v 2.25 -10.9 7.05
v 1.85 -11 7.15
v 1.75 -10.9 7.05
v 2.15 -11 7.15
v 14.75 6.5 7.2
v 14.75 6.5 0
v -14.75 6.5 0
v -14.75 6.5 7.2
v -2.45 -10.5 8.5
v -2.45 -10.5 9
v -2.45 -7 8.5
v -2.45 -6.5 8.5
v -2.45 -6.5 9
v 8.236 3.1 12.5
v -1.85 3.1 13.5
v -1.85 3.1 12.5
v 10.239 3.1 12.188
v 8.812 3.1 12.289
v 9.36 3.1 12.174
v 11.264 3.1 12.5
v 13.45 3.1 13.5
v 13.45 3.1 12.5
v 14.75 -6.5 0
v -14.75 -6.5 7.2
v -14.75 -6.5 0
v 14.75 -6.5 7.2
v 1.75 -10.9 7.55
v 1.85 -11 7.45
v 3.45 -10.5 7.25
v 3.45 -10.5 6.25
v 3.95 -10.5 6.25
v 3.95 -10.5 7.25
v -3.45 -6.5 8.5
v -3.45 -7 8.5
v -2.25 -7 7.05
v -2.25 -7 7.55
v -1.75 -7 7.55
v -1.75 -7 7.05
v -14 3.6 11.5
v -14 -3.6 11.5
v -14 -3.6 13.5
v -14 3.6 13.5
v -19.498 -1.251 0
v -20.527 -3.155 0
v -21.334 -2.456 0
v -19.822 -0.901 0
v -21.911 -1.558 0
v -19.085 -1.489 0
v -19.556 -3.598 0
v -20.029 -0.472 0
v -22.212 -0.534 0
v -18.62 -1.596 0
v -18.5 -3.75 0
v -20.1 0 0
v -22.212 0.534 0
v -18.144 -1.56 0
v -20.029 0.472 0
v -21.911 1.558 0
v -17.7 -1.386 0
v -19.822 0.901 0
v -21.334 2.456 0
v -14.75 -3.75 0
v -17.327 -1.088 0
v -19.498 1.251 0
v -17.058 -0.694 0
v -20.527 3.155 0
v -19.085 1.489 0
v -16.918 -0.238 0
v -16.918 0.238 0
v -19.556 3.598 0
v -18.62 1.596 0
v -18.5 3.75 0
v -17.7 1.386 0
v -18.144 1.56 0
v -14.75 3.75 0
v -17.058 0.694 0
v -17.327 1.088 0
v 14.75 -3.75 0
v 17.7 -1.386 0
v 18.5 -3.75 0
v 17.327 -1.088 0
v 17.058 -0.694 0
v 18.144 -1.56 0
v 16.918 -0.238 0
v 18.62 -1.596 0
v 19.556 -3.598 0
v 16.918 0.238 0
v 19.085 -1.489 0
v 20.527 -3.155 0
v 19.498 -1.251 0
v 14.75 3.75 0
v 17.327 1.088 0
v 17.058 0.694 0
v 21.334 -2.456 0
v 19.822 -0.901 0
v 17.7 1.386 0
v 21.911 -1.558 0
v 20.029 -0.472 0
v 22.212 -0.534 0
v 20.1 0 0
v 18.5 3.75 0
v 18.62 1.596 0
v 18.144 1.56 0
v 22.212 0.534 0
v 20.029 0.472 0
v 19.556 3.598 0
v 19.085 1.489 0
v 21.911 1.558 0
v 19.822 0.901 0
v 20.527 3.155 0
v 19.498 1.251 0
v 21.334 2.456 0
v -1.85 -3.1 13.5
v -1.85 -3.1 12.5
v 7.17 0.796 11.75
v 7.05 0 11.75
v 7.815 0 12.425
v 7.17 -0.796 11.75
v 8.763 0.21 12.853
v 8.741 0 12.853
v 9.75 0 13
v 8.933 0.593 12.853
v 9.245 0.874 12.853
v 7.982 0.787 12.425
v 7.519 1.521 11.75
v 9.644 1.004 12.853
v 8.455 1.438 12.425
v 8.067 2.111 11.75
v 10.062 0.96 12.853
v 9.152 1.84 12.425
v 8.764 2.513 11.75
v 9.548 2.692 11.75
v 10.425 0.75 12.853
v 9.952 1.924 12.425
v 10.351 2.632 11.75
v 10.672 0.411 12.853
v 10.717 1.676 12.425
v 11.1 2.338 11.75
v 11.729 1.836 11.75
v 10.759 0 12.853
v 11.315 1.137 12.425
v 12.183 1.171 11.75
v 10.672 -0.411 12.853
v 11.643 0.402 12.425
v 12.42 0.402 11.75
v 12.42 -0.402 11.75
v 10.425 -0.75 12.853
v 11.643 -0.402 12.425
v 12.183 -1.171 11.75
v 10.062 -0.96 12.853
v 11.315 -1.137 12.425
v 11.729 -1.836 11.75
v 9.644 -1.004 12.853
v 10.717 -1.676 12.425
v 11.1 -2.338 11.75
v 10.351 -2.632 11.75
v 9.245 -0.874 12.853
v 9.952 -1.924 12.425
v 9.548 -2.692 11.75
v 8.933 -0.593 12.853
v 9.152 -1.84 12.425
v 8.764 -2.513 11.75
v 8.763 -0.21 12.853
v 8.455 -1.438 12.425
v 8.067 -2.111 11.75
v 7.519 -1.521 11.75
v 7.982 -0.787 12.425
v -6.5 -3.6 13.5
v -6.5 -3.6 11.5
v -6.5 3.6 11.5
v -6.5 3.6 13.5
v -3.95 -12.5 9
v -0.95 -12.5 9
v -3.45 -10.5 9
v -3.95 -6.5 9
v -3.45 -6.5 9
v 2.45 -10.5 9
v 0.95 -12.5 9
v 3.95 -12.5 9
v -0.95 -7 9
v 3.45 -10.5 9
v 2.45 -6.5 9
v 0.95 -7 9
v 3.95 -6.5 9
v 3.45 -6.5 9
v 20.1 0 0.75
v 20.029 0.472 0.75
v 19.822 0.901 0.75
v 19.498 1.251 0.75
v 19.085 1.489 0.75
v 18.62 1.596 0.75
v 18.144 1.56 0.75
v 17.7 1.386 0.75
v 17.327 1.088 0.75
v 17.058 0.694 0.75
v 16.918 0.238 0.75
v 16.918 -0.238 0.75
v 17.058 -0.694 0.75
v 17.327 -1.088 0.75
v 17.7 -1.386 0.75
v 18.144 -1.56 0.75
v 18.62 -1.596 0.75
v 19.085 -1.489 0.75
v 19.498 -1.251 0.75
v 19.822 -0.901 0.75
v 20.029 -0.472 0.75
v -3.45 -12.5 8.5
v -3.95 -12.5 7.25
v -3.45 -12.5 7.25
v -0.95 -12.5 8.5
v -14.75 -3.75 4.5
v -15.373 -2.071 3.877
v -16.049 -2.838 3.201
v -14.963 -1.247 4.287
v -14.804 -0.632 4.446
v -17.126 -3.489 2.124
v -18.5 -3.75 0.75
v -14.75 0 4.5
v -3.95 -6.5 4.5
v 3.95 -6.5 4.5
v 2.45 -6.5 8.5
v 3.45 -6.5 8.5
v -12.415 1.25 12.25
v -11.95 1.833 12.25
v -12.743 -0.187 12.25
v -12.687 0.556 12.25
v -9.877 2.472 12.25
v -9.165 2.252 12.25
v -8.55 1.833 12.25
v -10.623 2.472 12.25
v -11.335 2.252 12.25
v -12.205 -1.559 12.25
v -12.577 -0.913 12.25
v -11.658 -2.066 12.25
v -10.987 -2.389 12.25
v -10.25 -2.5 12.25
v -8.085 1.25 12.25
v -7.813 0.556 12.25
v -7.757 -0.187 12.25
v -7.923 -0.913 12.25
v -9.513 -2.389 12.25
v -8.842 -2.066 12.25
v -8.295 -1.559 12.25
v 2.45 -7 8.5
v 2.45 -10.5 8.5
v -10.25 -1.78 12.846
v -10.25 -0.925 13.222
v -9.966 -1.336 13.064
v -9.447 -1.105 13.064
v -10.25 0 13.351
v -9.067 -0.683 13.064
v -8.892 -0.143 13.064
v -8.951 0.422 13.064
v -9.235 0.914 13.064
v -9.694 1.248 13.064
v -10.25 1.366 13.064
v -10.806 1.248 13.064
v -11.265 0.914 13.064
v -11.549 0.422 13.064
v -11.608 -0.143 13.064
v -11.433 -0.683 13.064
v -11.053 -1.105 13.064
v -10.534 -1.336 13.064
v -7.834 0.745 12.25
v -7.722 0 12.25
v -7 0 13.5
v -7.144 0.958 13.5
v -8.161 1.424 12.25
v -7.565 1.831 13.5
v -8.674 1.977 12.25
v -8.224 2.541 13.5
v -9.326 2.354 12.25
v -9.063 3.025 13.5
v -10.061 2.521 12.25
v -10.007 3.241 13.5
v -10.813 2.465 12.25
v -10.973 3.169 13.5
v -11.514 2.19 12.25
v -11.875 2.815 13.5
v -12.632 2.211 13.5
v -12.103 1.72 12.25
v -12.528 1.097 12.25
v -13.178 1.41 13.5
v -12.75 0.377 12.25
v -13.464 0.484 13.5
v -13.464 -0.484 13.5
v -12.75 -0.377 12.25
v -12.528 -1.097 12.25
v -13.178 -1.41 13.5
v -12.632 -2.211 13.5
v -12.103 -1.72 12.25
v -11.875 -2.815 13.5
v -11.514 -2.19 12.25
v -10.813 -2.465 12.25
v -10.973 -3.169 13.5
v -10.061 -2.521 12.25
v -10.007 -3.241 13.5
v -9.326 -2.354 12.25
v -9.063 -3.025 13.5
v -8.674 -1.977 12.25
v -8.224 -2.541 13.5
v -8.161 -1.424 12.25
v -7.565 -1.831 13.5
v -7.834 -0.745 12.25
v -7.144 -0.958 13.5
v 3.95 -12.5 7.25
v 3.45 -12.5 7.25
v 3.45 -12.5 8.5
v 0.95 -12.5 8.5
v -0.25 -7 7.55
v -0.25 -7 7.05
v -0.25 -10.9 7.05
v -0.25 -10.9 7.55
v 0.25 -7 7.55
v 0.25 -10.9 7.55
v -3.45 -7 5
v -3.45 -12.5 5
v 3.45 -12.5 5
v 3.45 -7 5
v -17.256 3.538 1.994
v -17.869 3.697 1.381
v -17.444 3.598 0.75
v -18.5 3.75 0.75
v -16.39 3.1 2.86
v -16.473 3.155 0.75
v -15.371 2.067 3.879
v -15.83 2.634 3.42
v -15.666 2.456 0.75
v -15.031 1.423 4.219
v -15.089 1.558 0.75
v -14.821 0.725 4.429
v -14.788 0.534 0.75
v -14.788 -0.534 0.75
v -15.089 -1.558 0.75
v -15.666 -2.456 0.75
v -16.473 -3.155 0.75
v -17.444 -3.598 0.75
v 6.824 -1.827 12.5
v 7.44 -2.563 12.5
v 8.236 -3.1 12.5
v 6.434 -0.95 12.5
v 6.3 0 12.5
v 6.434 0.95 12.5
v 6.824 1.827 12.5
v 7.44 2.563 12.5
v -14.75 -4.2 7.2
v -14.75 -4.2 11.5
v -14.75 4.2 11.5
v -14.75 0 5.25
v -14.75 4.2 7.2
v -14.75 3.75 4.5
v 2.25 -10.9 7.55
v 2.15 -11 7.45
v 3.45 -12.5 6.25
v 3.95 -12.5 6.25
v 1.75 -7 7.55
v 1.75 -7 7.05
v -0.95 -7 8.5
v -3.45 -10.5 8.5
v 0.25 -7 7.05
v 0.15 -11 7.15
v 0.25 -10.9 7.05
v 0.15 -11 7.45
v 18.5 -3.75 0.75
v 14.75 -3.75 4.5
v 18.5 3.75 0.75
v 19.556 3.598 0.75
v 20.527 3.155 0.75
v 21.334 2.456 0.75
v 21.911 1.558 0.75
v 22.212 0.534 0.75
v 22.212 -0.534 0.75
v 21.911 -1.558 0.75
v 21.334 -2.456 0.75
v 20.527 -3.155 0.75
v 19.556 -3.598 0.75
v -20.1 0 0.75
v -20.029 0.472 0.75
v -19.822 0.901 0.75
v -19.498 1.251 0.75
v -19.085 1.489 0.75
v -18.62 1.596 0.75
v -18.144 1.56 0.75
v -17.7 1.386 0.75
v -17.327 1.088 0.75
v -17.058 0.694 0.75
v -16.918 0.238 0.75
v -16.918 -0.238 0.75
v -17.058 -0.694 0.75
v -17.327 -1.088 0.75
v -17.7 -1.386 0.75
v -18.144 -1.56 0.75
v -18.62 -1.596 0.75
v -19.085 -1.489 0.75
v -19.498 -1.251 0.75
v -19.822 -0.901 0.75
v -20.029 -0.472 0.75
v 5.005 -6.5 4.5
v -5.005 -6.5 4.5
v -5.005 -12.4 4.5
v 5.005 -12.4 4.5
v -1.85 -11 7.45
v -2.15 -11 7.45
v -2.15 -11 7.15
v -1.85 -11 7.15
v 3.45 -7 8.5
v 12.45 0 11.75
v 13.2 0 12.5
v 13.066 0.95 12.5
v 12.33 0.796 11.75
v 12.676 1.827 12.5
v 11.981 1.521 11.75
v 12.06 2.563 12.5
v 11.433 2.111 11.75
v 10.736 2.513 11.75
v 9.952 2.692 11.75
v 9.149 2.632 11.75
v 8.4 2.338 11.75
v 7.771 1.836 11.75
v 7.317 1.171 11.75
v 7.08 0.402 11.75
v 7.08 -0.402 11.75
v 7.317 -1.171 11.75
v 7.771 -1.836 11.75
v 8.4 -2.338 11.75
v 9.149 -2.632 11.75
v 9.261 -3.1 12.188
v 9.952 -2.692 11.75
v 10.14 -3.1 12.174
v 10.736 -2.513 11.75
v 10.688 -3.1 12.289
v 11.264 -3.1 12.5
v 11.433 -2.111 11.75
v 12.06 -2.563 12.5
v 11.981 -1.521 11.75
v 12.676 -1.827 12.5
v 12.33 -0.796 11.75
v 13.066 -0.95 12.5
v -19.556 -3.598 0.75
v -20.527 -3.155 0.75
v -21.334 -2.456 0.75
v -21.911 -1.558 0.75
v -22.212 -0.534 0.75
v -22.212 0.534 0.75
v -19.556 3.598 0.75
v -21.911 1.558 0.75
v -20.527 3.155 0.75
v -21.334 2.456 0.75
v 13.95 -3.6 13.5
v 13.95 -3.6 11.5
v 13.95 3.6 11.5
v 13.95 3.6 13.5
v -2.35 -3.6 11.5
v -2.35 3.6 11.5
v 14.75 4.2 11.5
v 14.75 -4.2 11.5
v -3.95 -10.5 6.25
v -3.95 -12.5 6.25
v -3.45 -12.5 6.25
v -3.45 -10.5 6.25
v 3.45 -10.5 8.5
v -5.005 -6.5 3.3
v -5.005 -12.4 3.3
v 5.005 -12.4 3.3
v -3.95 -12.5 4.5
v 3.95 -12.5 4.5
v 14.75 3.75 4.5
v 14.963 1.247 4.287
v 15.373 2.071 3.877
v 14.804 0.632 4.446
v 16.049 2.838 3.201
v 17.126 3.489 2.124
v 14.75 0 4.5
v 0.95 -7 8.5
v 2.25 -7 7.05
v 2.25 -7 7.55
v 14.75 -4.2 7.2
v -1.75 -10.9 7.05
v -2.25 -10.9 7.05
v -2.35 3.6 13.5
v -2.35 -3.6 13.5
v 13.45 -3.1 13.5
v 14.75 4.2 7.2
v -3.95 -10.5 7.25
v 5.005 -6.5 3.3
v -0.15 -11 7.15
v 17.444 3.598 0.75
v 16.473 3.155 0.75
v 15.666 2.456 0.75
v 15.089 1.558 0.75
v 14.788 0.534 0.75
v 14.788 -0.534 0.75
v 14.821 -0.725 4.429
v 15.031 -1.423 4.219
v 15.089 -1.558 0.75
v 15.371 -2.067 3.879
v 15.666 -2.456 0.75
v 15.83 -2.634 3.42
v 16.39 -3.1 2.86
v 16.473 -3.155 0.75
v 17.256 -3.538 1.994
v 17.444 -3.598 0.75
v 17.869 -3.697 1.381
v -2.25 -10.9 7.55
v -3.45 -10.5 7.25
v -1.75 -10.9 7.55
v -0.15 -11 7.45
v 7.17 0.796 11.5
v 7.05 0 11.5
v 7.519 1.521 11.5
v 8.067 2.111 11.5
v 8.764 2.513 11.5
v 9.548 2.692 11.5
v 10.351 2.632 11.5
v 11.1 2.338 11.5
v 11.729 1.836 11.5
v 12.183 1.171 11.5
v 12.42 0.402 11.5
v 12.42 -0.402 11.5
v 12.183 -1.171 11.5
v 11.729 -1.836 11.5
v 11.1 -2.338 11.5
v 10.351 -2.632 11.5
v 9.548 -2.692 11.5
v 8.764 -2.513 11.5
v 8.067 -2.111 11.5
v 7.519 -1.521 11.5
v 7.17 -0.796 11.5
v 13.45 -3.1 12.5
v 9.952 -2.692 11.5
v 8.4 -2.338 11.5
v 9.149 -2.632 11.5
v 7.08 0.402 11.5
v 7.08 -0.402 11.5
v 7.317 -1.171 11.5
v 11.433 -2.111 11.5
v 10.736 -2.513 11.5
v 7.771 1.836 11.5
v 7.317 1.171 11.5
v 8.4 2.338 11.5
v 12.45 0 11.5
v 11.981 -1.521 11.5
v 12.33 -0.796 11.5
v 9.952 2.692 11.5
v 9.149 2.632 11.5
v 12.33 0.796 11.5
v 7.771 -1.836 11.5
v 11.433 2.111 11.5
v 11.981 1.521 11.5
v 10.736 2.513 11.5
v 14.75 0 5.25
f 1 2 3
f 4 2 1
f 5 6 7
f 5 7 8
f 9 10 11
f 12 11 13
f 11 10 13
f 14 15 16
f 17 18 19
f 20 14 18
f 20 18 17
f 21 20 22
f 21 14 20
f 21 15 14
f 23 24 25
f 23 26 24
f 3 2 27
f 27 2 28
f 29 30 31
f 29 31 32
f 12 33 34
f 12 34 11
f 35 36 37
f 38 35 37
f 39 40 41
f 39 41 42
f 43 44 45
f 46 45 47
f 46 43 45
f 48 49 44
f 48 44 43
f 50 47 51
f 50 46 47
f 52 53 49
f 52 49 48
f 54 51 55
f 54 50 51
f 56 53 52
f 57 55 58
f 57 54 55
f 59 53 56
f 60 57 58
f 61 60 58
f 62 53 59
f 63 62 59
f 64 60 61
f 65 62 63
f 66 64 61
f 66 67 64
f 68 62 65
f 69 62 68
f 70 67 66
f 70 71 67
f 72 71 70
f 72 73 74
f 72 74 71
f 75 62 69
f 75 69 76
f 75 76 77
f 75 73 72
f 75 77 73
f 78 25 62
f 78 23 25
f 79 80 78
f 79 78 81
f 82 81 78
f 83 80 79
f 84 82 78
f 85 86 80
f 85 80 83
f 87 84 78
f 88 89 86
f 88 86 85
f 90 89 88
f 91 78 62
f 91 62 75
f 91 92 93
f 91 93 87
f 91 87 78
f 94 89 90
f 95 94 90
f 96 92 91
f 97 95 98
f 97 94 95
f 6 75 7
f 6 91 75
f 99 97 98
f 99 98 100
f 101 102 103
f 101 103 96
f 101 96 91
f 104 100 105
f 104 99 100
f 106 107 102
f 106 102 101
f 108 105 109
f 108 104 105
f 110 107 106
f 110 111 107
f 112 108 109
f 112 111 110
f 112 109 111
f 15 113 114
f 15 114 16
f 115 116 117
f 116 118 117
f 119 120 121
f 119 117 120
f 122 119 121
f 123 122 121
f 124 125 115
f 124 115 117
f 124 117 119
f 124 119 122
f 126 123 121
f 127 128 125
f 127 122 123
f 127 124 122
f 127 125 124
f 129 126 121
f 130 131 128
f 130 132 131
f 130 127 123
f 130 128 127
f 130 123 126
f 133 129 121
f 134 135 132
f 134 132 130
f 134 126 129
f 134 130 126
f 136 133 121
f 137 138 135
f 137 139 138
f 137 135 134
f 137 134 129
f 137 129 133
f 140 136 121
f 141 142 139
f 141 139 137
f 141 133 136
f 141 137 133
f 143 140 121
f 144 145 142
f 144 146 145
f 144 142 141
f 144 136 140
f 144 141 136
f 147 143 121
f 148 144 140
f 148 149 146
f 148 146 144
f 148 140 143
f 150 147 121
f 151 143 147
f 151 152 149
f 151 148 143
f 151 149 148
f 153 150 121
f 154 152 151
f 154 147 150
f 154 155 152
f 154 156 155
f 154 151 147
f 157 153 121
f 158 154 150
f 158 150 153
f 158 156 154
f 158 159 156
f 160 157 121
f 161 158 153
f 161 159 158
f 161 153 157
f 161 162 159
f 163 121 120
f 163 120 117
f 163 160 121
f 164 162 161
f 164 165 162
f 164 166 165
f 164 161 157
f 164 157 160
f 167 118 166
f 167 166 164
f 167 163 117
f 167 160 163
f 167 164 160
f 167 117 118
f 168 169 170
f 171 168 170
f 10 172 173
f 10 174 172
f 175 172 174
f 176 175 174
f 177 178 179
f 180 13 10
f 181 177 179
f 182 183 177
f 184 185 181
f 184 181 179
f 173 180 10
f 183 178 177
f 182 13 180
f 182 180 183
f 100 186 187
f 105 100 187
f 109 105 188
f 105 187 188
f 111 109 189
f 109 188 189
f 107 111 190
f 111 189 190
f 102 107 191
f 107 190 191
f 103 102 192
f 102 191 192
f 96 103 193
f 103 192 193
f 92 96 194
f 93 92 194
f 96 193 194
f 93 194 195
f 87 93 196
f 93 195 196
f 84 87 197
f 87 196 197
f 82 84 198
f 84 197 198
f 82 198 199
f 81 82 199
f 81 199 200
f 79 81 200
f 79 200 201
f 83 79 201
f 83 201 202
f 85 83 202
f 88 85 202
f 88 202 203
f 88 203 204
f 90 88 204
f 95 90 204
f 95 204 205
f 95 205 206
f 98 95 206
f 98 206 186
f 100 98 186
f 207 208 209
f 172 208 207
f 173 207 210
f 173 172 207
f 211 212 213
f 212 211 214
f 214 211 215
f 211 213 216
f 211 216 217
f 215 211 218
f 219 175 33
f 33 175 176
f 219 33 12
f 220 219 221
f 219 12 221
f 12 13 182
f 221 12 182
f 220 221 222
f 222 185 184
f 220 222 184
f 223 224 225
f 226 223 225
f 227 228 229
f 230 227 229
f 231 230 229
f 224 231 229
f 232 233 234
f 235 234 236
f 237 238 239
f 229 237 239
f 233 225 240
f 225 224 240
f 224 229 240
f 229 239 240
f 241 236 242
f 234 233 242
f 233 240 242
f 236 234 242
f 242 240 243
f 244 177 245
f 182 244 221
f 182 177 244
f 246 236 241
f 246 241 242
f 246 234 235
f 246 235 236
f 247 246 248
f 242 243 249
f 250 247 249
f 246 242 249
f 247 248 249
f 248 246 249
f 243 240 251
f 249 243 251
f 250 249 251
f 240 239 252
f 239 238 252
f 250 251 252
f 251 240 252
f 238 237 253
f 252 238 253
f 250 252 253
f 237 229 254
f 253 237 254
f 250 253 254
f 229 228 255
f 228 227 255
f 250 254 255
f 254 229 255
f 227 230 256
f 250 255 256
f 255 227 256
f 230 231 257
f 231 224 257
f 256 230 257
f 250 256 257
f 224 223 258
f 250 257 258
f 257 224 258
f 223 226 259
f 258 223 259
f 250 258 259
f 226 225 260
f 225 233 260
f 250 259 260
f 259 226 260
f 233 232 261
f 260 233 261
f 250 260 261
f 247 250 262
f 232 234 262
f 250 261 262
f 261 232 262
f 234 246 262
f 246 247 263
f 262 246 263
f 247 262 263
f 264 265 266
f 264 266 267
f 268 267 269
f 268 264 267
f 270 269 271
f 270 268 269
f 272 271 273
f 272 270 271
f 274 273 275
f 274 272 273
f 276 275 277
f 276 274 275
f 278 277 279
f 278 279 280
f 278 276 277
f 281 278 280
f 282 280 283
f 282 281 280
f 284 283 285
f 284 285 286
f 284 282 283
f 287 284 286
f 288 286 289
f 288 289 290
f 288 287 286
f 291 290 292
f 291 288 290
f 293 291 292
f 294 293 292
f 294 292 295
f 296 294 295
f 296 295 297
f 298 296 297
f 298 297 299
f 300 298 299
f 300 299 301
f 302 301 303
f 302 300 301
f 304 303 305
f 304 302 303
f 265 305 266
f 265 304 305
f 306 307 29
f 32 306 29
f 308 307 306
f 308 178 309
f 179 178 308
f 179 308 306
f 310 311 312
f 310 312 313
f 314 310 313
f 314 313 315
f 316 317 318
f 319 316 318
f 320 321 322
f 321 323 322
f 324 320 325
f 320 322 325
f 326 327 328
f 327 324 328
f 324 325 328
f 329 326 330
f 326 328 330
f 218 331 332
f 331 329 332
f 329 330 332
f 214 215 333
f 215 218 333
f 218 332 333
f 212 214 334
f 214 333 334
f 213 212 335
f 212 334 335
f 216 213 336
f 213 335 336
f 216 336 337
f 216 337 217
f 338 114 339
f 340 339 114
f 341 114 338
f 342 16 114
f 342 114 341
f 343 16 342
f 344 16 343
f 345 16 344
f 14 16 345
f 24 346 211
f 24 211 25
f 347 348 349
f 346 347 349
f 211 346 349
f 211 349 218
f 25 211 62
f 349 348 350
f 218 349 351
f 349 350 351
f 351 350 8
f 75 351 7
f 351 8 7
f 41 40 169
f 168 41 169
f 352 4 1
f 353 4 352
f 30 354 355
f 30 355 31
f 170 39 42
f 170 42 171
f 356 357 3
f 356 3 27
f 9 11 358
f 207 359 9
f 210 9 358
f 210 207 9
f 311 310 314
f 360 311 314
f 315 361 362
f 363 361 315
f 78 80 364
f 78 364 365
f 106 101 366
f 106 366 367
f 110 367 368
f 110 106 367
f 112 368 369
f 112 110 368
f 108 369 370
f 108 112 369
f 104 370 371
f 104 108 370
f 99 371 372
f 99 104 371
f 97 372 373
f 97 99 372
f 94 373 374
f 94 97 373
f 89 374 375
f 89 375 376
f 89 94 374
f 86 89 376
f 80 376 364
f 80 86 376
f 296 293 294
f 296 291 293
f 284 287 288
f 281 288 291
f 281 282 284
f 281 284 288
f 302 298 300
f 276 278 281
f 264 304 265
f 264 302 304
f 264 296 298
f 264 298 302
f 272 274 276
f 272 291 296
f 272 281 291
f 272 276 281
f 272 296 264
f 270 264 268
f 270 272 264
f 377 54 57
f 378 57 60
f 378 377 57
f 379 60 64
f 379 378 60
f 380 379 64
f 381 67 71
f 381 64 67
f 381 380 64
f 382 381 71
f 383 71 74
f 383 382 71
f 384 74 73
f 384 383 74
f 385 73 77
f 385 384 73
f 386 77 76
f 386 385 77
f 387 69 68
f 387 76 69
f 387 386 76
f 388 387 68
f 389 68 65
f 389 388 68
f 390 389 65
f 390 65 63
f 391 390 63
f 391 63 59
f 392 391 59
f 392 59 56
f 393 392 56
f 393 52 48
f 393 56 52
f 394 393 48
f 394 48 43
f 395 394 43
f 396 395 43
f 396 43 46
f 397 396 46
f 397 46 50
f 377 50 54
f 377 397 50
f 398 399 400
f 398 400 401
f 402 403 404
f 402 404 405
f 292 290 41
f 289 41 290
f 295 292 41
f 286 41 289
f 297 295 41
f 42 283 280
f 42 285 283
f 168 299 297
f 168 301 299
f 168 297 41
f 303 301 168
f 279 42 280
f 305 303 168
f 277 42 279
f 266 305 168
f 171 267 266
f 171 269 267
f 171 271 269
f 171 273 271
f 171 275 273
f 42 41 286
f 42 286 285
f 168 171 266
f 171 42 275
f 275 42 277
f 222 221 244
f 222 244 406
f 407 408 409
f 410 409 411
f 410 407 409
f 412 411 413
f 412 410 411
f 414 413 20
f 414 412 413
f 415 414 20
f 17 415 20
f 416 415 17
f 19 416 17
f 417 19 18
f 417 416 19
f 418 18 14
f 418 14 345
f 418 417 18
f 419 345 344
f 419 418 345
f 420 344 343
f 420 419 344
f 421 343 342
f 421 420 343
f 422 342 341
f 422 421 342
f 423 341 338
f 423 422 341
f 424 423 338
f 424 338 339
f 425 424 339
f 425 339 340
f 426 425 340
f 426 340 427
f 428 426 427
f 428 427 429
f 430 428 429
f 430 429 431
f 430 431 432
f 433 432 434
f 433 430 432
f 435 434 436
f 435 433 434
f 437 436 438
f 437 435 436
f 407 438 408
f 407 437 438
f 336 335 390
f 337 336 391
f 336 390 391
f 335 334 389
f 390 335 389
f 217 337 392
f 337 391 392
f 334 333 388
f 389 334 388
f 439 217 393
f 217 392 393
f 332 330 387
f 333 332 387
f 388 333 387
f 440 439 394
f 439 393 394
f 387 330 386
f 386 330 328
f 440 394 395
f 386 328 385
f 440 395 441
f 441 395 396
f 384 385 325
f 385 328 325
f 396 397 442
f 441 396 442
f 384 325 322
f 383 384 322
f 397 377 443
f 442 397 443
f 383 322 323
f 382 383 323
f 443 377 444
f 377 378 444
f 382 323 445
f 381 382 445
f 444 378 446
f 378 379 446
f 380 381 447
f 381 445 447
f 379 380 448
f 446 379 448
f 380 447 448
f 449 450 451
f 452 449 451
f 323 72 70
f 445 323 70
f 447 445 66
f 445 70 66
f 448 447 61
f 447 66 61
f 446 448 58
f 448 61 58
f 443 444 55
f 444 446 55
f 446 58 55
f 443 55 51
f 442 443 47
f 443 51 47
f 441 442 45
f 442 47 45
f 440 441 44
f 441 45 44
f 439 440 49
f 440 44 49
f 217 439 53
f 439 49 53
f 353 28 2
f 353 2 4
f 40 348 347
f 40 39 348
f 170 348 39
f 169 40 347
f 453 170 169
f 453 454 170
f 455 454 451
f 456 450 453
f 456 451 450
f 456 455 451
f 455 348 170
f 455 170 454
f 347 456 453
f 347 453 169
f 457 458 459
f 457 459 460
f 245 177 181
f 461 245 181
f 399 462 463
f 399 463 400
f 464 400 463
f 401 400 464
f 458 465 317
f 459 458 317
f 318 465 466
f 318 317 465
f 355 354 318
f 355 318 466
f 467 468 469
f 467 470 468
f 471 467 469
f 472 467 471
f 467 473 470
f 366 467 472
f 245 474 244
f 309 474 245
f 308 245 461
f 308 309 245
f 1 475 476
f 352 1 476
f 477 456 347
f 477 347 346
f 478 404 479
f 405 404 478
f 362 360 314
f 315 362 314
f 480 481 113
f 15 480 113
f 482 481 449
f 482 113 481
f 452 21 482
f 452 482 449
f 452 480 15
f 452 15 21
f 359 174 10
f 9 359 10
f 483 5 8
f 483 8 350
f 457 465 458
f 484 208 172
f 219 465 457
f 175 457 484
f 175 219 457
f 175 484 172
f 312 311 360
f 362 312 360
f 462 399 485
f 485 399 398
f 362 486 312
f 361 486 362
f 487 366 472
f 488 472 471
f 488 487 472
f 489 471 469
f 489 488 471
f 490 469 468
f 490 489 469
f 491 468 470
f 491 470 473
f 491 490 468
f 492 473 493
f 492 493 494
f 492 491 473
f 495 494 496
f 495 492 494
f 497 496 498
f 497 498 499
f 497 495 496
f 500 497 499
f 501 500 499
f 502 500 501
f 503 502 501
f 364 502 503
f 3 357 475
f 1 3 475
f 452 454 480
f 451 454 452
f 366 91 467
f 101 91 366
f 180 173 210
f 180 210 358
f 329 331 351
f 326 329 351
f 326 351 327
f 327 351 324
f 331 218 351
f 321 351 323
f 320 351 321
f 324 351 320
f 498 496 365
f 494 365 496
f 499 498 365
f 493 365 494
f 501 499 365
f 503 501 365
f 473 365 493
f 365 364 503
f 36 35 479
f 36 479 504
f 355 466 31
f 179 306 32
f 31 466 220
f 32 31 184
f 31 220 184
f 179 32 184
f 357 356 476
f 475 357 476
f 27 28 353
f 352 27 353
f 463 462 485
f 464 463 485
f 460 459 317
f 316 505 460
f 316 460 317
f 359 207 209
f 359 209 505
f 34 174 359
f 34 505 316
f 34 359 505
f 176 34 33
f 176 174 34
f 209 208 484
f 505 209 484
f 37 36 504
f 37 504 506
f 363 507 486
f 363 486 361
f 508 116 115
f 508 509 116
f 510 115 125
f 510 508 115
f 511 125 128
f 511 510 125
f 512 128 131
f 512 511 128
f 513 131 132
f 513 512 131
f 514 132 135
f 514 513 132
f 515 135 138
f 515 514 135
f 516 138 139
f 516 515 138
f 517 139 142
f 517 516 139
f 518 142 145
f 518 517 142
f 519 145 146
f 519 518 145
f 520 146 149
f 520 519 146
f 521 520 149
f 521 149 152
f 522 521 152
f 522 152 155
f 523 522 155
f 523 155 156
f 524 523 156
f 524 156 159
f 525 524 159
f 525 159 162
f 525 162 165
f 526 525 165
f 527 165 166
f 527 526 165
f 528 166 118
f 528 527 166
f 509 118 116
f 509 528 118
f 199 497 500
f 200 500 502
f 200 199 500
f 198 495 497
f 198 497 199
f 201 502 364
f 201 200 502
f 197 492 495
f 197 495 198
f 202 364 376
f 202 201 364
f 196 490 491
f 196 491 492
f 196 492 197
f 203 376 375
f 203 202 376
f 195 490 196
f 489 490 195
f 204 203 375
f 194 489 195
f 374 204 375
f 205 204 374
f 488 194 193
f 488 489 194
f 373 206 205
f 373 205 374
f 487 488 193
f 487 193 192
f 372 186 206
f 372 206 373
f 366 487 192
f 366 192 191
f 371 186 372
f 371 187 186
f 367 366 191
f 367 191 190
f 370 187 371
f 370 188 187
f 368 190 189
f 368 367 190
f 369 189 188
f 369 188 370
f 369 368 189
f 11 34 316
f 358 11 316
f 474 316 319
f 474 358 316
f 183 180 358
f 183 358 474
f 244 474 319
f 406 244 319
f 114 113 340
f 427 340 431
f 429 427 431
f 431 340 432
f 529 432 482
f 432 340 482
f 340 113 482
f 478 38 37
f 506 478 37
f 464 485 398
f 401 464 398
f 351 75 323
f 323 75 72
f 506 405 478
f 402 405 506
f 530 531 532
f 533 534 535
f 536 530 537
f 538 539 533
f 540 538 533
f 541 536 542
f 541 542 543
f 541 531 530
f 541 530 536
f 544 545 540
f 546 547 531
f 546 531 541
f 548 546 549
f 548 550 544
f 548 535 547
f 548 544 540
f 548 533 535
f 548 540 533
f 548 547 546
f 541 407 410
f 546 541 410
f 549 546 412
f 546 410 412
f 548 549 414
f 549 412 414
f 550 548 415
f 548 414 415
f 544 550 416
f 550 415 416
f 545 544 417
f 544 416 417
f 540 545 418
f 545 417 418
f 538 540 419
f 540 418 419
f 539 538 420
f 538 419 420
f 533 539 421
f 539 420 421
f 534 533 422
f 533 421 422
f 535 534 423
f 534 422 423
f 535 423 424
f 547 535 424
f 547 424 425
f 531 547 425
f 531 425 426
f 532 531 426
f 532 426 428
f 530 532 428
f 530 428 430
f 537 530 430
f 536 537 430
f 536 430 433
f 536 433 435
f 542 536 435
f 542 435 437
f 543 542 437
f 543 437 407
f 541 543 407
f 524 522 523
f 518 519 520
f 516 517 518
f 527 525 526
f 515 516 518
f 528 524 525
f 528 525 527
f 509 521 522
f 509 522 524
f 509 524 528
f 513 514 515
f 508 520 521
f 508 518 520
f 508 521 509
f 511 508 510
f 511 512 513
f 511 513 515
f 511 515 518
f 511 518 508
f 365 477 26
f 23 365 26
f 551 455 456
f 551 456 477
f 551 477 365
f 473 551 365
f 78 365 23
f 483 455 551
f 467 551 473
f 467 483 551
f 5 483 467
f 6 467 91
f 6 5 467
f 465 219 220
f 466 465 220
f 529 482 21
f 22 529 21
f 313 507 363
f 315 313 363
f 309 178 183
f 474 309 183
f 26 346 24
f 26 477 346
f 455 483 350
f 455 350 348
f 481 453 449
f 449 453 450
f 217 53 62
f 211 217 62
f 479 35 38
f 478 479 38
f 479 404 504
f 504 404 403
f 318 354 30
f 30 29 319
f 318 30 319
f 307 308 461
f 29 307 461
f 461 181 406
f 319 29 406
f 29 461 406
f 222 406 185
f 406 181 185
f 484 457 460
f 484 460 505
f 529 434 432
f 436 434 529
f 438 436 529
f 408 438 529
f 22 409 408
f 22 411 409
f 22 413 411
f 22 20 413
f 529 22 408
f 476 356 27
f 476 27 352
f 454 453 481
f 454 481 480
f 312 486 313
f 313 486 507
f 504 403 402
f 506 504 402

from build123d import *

# Parameters (mm, degrees)
BOSS_EXTRUDE5_DEPTH  = 14.75
SKETCH9_W            = 7.5
SKETCH9_H            = 7.2
SKETCH9_W_2          = 16.3
BOSS_EXTRUDE6_DEPTH  = 2
SKETCH10_W           = 15.3
SKETCH10_H           = 6.2
CUT_EXTRUDE4_DEPTH   = 1
SKETCH11_R           = 2.5
CUT_EXTRUDE5_DEPTH   = 1.25
BOSS_EXTRUDE7_DEPTH  = 4.5
CUT_EXTRUDE7_START   = -7.5
CUT_EXTRUDE7_DEPTH   = 7.5
SKETCH18_R           = 3.75
CUT_EXTRUDE8_DEPTH   = 4.5
SKETCH19_R           = 1.6
CUT_EXTRUDE9_DEPTH   = 4.5
CHAMFER1_SIZE        = 0.75
CHAMFER1_SIZE_2      = 1.299038106
SKETCH13_R           = 2.7
CUT_EXTRUDE6_DEPTH   = 1
CHAMFER2_SIZE        = 0.75
SKETCH20_W           = 10.01
SKETCH20_H           = 1.2
BOSS_EXTRUDE8_DEPTH  = 5.9
SKETCH21_W           = 7.9
SKETCH21_H           = 4.5
BOSS_EXTRUDE9_DEPTH  = 6
SKETCH23_W           = 6.9
SKETCH23_H           = 3.5
CUT_EXTRUDE11_DEPTH  = 5.5
SKETCH24_W           = 1.9
SKETCH24_H           = 5.5
SKETCH24_W_2         = 1
SKETCH24_H_2         = 4
CUT_EXTRUDE12_DEPTH  = 0.5
CUT_EXTRUDE13_REACH  = 34.015
SKETCH25_W           = 1
SKETCH25_H           = 2
SKETCH26_W           = 0.5
SKETCH26_H           = 0.5
BOSS_EXTRUDE10_DEPTH = 4
CHAMFER3_SIZE        = 0.1
LPATTERN1_COUNT      = 3
LPATTERN1_PITCH      = 2


# Read off the part's stored shape, not the designer's step: Cut-Extrude7
with BuildPart() as part:
    # Sketch8 → Boss-Extrude5 (new, symmetric)
    with BuildSketch(Plane(origin=(0, 0, 0), x_dir=(0, 0, -1), z_dir=(1, 0, 0))):
        Polygon((0, -6.5), (0, 6.5), (-7.2, 6.5), (-7.2, 4.2), (-11.5, 4.2), (-11.5, -4.2), (-7.2, -4.2), (-7.2, -6.5), align=None)
    extrude(amount=BOSS_EXTRUDE5_DEPTH, both=True)

    # Sketch9 → Boss-Extrude6 (add)
    with BuildSketch(Plane.XY.offset(11.5)):
        with Locations((-10.25, 0)):
            Rectangle(SKETCH9_W, SKETCH9_H)
        with Locations((5.8, 0)):
            Rectangle(SKETCH9_W_2, SKETCH9_H)
    extrude(amount=BOSS_EXTRUDE6_DEPTH)

    # Sketch10 → Cut-Extrude4 (cut)
    with BuildSketch(Plane.XY.offset(13.5)):
        with Locations((5.8, 0)):
            Rectangle(SKETCH10_W, SKETCH10_H)
    extrude(amount=-CUT_EXTRUDE4_DEPTH, mode=Mode.SUBTRACT)

    # Sketch11 → Cut-Extrude5 (cut)
    with BuildSketch(Plane.XY.offset(13.5)):
        with Locations((-10.25, 0)):
            Circle(SKETCH11_R)
    extrude(amount=-CUT_EXTRUDE5_DEPTH, mode=Mode.SUBTRACT)

    # Sketch16 → Boss-Extrude7 (add)
    with BuildSketch(Plane(origin=(0, 0, 0), x_dir=(-1, 0, 0), z_dir=(0, 0, -1))):
        with BuildLine():
            Line((-14.75, -3.75), (-14.75, 3.75))
            Line((-14.75, 3.75), (-18.5, 3.75))
            ThreePointArc((-18.5, 3.75), (-22.25, 0), (-18.5, -3.75))
            Line((-18.5, -3.75), (-14.75, -3.75))
        make_face()
    boss_extrude7 = extrude(amount=-BOSS_EXTRUDE7_DEPTH)

    # Cut-Extrude7 outline → Cut-Extrude7 (cut)
    with BuildSketch(Plane.XZ.offset(3.75).offset(CUT_EXTRUDE7_START)):
        Polygon((14.75, 4.5), (18.5, 0.75), (24, 0.75), (24, 4.5), align=None)
    cut_extrude7 = extrude(amount=CUT_EXTRUDE7_DEPTH, mode=Mode.SUBTRACT)

    # Sketch18 → Cut-Extrude8 (cut)
    with BuildSketch(Plane.XY.offset(0.75)):
        with Locations((18.5, 0)):
            Circle(SKETCH18_R)
    cut_extrude8 = extrude(amount=CUT_EXTRUDE8_DEPTH, mode=Mode.SUBTRACT)

    # Sketch19 → Cut-Extrude9 (cut)
    with BuildSketch(Plane.XY.offset(0.75)):
        with Locations((18.5, 0)):
            Circle(SKETCH19_R)
    cut_extrude9 = extrude(amount=-CUT_EXTRUDE9_DEPTH, mode=Mode.SUBTRACT)

    # Mirror1: Boss-Extrude7, Cut-Extrude7, Cut-Extrude8, Cut-Extrude9 across plane
    add(boss_extrude7.mirror(Plane(origin=(0, 0, 0), x_dir=(0, 0, 1), z_dir=(1, 0, 0))))
    add(cut_extrude7.mirror(Plane(origin=(0, 0, 0), x_dir=(0, 0, 1), z_dir=(1, 0, 0))), mode=Mode.SUBTRACT)
    add(cut_extrude8.mirror(Plane(origin=(0, 0, 0), x_dir=(0, 0, 1), z_dir=(1, 0, 0))), mode=Mode.SUBTRACT)
    add(cut_extrude9.mirror(Plane(origin=(0, 0, 0), x_dir=(0, 0, 1), z_dir=(1, 0, 0))), mode=Mode.SUBTRACT)

    # Chamfer1
    # the kernel refuses this chamfer: 1.299038106, 0.75 mm, written as the material it takes off along each edge
    with BuildSketch(Plane(origin=(-10.25, 0, 13.5), x_dir=(1, 0, 0), z_dir=(0, -1, 0))) as chamfer1_piece_1_section:
        Polygon((2.5 + CHAMFER1_SIZE, 0), (2.5, -CHAMFER1_SIZE_2), (2.5, 0), align=None)
    chamfer1_piece_1 = revolve(axis=Axis((-10.25, 0, 13.5), (0, 0, 1)), mode=Mode.PRIVATE)
    chamfer1_piece_1 = split(chamfer1_piece_1, bisect_by=Plane(origin=(-13.133837987, 0, 12.25), z_dir=(0, 0, 1)), keep=Keep.TOP, mode=Mode.PRIVATE)
    add(chamfer1_piece_1, mode=Mode.SUBTRACT)

    # Sketch13 → Cut-Extrude6 (cut)
    with BuildSketch(Plane.XY.offset(12.5)):
        with Locations((9.75, 0)):
            Circle(SKETCH13_R)
    extrude(amount=-CUT_EXTRUDE6_DEPTH, mode=Mode.SUBTRACT)

    # Chamfer2
    # the kernel refuses this chamfer: 0.75 mm, written as the material it takes off along each edge
    with BuildSketch(Plane(origin=(9.75, 0, 12.5), x_dir=(1, 0, 0), z_dir=(0, -1, 0))) as chamfer2_piece_1_section:
        Polygon((2.7 + CHAMFER2_SIZE, 0), (2.7, -CHAMFER2_SIZE), (2.7, 0), align=None)
    chamfer2_piece_1 = revolve(axis=Axis((9.75, 0, 12.5), (0, 0, 1)), mode=Mode.PRIVATE)
    chamfer2_piece_1 = split(chamfer2_piece_1, bisect_by=Plane(origin=(6.68747717, -3.1, 12.13747717), z_dir=(0, 1, 0)), keep=Keep.TOP, mode=Mode.PRIVATE)
    chamfer2_piece_1 = split(chamfer2_piece_1, bisect_by=Plane(origin=(6.68747717, 3.1, 12.13747717), z_dir=(0, -1, 0)), keep=Keep.TOP, mode=Mode.PRIVATE)
    add(chamfer2_piece_1, mode=Mode.SUBTRACT)


with BuildPart() as body_2:
    # Sketch12 → Revolve1 (revolve)
    with BuildSketch(Plane.ZY.offset(10.25), mode=Mode.PRIVATE) as revolve1_sk:
        with BuildLine():
            Line((12.25, 2.5), (12.25, 0))
            Line((12.25, 0), (13.351165831, 0))
            ThreePointArc((13.351165831, 0), (13.063678836, 1.365884895), (12.25, 2.5))
        make_face()
    revolve(revolve1_sk.sketch.rotate(Axis((-10.25, 0, 12.25), (0, 0, 1)), 180), axis=Axis((-10.25, 0, 12.25), (0, 0, 1)))


with BuildPart() as body_3:
    # Sketch15 → Revolve2 (revolve)
    with BuildSketch(Plane(origin=(0, 0, 0), x_dir=(1, 0, 0), z_dir=(0, 1, 0))):
        with BuildLine():
            Line((9.75, -11.5), (9.75, -13))
            ThreePointArc((9.75, -13), (8.262342445, -12.672340318), (7.05, -11.75))
            Line((7.05, -11.75), (7.05, -11.5))
            Line((7.05, -11.5), (9.75, -11.5))
        make_face()
    revolve(axis=Axis((9.75, 0, 13), (0, 0, -1)))


with BuildPart() as body_4:
    # Sketch20 → Boss-Extrude8 (new body)
    with BuildSketch(Plane.XZ.offset(6.5)):
        with Locations((0, 3.9)):
            Rectangle(SKETCH20_W, SKETCH20_H)
    extrude(amount=BOSS_EXTRUDE8_DEPTH)


with BuildPart() as body_5:
    # Sketch21 → Boss-Extrude9 (new body)
    with BuildSketch(Plane.XZ.offset(6.5)):
        with Locations((0, 6.75)):
            Rectangle(SKETCH21_W, SKETCH21_H)
    extrude(amount=BOSS_EXTRUDE9_DEPTH)

    # Sketch23 → Cut-Extrude11 (cut)
    with BuildSketch(Plane.XZ.offset(12.5)):
        with Locations((0, 6.75)):
            Rectangle(SKETCH23_W, SKETCH23_H)
    extrude(amount=-CUT_EXTRUDE11_DEPTH, mode=Mode.SUBTRACT)

    # Sketch24 → Cut-Extrude12 (cut)
    with BuildSketch(Plane.XY.offset(9)):
        with Locations((0, -9.75)):
            Rectangle(SKETCH24_W, SKETCH24_H)
        with Locations((-2.95, -8.5)):
            Rectangle(SKETCH24_W_2, SKETCH24_H_2)
        with Locations((2.95, -8.5)):
            Rectangle(SKETCH24_W_2, SKETCH24_H_2)
    extrude(amount=-CUT_EXTRUDE12_DEPTH, mode=Mode.SUBTRACT)

    # Cut-Extrude13: up to this face of the body (flat: up to its plane)
    cut_extrude13_end = Plane(body_5.part.faces().sort_by_distance((3.95, -9.5, 6.75))[0])
    # Sketch25 → Cut-Extrude13 (cut, up to the picked face)
    with BuildSketch(Plane.ZY.offset(3.95), mode=Mode.PRIVATE) as cut_extrude13_sk1:
        with Locations((6.75, -11.5)):
            Rectangle(SKETCH25_W, SKETCH25_H)
    cut_extrude13_tool1 = split(extrude(cut_extrude13_sk1.sketch, amount=-CUT_EXTRUDE13_REACH, mode=Mode.PRIVATE), bisect_by=cut_extrude13_end, keep=Keep.BOTH, mode=Mode.PRIVATE)
    add(cut_extrude13_tool1.solids().sort_by(Axis((-3.95, -11.5, 6.75), (1, 0, 0)))[0], mode=Mode.SUBTRACT)


with BuildPart() as body_6:
    # Sketch26 → Boss-Extrude10 (new body)
    with BuildSketch(Plane.XZ.offset(7)):
        with Locations((-2, 7.3)):
            Rectangle(SKETCH26_W, SKETCH26_H)
    extrude(amount=BOSS_EXTRUDE10_DEPTH)

    # Chamfer3
    chamfer3_edges = [body_6.edges().sort_by_distance(p)[0] for p in [
        (-2.25, -11, 7.3),
        (-2, -11, 7.05),
        (-1.75, -11, 7.3),
        (-2, -11, 7.55),
    ]]
    chamfer(chamfer3_edges, length=CHAMFER3_SIZE)


with BuildPart() as lpattern1_1:
    # LPattern1: pattern copy
    add(body_6.part.moved(Location(Vector(1, 0, 0) * (1 * LPATTERN1_PITCH))))


with BuildPart() as lpattern1_2:
    # LPattern1: pattern copy
    add(body_6.part.moved(Location(Vector(1, 0, 0) * (2 * LPATTERN1_PITCH))))


solid = Compound([part.part, body_2.part, body_3.part, body_4.part, body_5.part, body_6.part, lpattern1_1.part, lpattern1_2.part])
